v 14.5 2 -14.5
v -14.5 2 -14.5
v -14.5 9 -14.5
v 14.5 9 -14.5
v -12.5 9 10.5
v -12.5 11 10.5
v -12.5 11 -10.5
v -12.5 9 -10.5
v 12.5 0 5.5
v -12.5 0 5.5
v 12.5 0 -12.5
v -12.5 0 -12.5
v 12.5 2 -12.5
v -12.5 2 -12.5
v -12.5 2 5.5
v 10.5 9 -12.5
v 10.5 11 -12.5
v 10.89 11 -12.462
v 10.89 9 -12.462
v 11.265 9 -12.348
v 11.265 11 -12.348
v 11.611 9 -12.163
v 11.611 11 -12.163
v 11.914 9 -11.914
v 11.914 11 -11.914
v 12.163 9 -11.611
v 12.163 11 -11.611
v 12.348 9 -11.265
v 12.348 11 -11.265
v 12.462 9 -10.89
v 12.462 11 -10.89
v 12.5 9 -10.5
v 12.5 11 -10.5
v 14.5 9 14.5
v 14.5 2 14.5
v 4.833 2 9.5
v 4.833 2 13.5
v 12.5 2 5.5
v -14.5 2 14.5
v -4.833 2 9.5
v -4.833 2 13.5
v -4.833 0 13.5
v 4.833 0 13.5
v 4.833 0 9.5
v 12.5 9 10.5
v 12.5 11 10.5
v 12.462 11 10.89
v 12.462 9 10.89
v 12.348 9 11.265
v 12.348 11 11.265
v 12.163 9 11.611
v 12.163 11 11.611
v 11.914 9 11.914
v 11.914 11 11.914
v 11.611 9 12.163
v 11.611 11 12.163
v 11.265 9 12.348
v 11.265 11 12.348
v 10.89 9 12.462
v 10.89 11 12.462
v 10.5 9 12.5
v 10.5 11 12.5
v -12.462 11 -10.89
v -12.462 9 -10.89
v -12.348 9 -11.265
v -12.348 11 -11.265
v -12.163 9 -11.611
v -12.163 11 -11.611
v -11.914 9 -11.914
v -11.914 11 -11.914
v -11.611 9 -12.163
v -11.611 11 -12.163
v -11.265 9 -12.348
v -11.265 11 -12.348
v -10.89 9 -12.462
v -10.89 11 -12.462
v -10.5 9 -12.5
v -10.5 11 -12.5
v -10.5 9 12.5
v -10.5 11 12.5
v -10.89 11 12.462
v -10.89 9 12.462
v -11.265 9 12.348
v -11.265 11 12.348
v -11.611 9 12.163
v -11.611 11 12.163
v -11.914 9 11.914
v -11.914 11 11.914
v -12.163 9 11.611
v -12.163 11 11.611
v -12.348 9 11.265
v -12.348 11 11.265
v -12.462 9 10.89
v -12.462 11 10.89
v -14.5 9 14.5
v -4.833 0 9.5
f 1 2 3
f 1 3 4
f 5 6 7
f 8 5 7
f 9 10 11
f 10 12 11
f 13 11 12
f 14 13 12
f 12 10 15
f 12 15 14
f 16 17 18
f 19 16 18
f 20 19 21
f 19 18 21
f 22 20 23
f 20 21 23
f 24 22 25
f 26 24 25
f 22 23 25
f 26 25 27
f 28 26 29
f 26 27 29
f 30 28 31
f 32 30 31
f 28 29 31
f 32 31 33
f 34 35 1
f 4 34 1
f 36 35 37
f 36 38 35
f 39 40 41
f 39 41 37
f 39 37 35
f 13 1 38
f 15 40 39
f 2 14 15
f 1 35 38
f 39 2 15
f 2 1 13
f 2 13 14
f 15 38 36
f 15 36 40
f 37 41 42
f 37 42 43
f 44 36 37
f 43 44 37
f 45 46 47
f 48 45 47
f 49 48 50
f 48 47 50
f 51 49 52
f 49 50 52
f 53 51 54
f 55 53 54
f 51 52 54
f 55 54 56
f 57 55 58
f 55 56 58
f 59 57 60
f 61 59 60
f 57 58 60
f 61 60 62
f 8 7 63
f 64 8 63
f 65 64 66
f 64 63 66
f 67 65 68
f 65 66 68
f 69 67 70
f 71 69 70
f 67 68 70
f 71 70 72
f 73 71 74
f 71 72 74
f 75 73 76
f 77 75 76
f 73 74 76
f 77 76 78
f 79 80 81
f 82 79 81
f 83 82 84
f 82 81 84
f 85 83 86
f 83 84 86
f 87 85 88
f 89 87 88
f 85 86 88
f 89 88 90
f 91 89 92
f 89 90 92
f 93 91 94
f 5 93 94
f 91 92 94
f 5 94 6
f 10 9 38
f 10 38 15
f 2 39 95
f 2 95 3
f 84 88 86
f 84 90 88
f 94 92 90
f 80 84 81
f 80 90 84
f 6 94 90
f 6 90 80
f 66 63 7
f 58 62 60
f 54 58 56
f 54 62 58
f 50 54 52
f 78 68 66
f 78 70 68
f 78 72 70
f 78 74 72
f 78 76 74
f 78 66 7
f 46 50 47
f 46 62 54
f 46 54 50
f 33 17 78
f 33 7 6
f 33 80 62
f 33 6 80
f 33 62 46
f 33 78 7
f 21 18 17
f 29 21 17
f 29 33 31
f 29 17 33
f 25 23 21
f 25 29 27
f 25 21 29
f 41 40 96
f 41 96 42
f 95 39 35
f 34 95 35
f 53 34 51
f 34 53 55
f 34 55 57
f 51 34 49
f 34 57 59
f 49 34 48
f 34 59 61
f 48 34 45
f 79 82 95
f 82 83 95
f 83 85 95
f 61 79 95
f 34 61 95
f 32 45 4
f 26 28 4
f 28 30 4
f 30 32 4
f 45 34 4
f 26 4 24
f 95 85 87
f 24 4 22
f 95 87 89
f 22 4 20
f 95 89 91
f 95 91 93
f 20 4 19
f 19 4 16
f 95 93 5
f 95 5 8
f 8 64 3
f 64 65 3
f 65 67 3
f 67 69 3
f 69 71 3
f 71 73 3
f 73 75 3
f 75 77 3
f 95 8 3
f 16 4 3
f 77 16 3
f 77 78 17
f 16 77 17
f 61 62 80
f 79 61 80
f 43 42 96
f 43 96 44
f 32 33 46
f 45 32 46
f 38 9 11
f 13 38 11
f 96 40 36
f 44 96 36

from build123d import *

# Parameters (mm, degrees)
SKETCH1_W           = 29
SKETCH1_H           = 29
BOSS_EXTRUDE1_DEPTH = 11
CUT_EXTRUDE1_DEPTH  = 2
SKETCH3_W           = 29
SKETCH3_H           = 29
SKETCH3_W_2         = 25
SKETCH3_H_2         = 18
CUT_EXTRUDE2_DEPTH  = 2
SKETCH4_W           = 9.666666666
SKETCH4_H           = 4
BOSS_EXTRUDE2_DEPTH = 2


with BuildPart() as part:
    # Sketch1 → Boss-Extrude1 (new body)
    with BuildSketch(Plane(origin=(0, 0, 0), x_dir=(1, 0, 0), z_dir=(0, 1, 0))):
        Rectangle(SKETCH1_W, SKETCH1_H)
    extrude(amount=BOSS_EXTRUDE1_DEPTH)

    # Sketch2 → Cut-Extrude1 (cut)
    with BuildSketch(Plane(origin=(0, 11, 0), x_dir=(1, 0, 0), z_dir=(0, 1, 0))):
        with BuildLine():
            Line((-10.5, 17.5), (10.5, 17.5))
            ThreePointArc((10.5, 17.5), (15.449747468, 15.449747468), (17.5, 10.5))
            Line((17.5, 10.5), (17.5, -10.5))
            ThreePointArc((17.5, -10.5), (15.449747468, -15.449747468), (10.5, -17.5))
            Line((10.5, -17.5), (-10.5, -17.5))
            ThreePointArc((-10.5, -17.5), (-15.449747468, -15.449747468), (-17.5, -10.5))
            Line((-17.5, -10.5), (-17.5, 10.5))
            ThreePointArc((-17.5, 10.5), (-15.449747468, 15.449747468), (-10.5, 17.5))
        make_face()
        with BuildLine():
            Line((-10.5, 12.5), (10.5, 12.5))
            ThreePointArc((10.5, 12.5), (11.914213562, 11.914213562), (12.5, 10.5))
            Line((12.5, 10.5), (12.5, -10.5))
            ThreePointArc((12.5, -10.5), (11.914213562, -11.914213562), (10.5, -12.5))
            Line((10.5, -12.5), (-10.5, -12.5))
            ThreePointArc((-10.5, -12.5), (-11.914213562, -11.914213562), (-12.5, -10.5))
            Line((-12.5, -10.5), (-12.5, 10.5))
            ThreePointArc((-12.5, 10.5), (-11.914213562, 11.914213562), (-10.5, 12.5))
        make_face(mode=Mode.SUBTRACT)
    extrude(amount=-CUT_EXTRUDE1_DEPTH, mode=Mode.SUBTRACT)

    # Sketch3 → Cut-Extrude2 (cut)
    with BuildSketch(Plane(origin=(0, 0, 0), x_dir=(-1, 0, 0), z_dir=(0, -1, 0))):
        Rectangle(SKETCH3_W, SKETCH3_H)
        with Locations((0, 3.5)):
            Rectangle(SKETCH3_W_2, SKETCH3_H_2, mode=Mode.SUBTRACT)
    extrude(amount=-CUT_EXTRUDE2_DEPTH, mode=Mode.SUBTRACT)

    # Sketch4 → Boss-Extrude2 (add)
    with BuildSketch(Plane.XZ.offset(-2)):
        with Locations((0, 11.5)):
            Rectangle(SKETCH4_W, SKETCH4_H)
    extrude(amount=BOSS_EXTRUDE2_DEPTH)


solid = part.part
